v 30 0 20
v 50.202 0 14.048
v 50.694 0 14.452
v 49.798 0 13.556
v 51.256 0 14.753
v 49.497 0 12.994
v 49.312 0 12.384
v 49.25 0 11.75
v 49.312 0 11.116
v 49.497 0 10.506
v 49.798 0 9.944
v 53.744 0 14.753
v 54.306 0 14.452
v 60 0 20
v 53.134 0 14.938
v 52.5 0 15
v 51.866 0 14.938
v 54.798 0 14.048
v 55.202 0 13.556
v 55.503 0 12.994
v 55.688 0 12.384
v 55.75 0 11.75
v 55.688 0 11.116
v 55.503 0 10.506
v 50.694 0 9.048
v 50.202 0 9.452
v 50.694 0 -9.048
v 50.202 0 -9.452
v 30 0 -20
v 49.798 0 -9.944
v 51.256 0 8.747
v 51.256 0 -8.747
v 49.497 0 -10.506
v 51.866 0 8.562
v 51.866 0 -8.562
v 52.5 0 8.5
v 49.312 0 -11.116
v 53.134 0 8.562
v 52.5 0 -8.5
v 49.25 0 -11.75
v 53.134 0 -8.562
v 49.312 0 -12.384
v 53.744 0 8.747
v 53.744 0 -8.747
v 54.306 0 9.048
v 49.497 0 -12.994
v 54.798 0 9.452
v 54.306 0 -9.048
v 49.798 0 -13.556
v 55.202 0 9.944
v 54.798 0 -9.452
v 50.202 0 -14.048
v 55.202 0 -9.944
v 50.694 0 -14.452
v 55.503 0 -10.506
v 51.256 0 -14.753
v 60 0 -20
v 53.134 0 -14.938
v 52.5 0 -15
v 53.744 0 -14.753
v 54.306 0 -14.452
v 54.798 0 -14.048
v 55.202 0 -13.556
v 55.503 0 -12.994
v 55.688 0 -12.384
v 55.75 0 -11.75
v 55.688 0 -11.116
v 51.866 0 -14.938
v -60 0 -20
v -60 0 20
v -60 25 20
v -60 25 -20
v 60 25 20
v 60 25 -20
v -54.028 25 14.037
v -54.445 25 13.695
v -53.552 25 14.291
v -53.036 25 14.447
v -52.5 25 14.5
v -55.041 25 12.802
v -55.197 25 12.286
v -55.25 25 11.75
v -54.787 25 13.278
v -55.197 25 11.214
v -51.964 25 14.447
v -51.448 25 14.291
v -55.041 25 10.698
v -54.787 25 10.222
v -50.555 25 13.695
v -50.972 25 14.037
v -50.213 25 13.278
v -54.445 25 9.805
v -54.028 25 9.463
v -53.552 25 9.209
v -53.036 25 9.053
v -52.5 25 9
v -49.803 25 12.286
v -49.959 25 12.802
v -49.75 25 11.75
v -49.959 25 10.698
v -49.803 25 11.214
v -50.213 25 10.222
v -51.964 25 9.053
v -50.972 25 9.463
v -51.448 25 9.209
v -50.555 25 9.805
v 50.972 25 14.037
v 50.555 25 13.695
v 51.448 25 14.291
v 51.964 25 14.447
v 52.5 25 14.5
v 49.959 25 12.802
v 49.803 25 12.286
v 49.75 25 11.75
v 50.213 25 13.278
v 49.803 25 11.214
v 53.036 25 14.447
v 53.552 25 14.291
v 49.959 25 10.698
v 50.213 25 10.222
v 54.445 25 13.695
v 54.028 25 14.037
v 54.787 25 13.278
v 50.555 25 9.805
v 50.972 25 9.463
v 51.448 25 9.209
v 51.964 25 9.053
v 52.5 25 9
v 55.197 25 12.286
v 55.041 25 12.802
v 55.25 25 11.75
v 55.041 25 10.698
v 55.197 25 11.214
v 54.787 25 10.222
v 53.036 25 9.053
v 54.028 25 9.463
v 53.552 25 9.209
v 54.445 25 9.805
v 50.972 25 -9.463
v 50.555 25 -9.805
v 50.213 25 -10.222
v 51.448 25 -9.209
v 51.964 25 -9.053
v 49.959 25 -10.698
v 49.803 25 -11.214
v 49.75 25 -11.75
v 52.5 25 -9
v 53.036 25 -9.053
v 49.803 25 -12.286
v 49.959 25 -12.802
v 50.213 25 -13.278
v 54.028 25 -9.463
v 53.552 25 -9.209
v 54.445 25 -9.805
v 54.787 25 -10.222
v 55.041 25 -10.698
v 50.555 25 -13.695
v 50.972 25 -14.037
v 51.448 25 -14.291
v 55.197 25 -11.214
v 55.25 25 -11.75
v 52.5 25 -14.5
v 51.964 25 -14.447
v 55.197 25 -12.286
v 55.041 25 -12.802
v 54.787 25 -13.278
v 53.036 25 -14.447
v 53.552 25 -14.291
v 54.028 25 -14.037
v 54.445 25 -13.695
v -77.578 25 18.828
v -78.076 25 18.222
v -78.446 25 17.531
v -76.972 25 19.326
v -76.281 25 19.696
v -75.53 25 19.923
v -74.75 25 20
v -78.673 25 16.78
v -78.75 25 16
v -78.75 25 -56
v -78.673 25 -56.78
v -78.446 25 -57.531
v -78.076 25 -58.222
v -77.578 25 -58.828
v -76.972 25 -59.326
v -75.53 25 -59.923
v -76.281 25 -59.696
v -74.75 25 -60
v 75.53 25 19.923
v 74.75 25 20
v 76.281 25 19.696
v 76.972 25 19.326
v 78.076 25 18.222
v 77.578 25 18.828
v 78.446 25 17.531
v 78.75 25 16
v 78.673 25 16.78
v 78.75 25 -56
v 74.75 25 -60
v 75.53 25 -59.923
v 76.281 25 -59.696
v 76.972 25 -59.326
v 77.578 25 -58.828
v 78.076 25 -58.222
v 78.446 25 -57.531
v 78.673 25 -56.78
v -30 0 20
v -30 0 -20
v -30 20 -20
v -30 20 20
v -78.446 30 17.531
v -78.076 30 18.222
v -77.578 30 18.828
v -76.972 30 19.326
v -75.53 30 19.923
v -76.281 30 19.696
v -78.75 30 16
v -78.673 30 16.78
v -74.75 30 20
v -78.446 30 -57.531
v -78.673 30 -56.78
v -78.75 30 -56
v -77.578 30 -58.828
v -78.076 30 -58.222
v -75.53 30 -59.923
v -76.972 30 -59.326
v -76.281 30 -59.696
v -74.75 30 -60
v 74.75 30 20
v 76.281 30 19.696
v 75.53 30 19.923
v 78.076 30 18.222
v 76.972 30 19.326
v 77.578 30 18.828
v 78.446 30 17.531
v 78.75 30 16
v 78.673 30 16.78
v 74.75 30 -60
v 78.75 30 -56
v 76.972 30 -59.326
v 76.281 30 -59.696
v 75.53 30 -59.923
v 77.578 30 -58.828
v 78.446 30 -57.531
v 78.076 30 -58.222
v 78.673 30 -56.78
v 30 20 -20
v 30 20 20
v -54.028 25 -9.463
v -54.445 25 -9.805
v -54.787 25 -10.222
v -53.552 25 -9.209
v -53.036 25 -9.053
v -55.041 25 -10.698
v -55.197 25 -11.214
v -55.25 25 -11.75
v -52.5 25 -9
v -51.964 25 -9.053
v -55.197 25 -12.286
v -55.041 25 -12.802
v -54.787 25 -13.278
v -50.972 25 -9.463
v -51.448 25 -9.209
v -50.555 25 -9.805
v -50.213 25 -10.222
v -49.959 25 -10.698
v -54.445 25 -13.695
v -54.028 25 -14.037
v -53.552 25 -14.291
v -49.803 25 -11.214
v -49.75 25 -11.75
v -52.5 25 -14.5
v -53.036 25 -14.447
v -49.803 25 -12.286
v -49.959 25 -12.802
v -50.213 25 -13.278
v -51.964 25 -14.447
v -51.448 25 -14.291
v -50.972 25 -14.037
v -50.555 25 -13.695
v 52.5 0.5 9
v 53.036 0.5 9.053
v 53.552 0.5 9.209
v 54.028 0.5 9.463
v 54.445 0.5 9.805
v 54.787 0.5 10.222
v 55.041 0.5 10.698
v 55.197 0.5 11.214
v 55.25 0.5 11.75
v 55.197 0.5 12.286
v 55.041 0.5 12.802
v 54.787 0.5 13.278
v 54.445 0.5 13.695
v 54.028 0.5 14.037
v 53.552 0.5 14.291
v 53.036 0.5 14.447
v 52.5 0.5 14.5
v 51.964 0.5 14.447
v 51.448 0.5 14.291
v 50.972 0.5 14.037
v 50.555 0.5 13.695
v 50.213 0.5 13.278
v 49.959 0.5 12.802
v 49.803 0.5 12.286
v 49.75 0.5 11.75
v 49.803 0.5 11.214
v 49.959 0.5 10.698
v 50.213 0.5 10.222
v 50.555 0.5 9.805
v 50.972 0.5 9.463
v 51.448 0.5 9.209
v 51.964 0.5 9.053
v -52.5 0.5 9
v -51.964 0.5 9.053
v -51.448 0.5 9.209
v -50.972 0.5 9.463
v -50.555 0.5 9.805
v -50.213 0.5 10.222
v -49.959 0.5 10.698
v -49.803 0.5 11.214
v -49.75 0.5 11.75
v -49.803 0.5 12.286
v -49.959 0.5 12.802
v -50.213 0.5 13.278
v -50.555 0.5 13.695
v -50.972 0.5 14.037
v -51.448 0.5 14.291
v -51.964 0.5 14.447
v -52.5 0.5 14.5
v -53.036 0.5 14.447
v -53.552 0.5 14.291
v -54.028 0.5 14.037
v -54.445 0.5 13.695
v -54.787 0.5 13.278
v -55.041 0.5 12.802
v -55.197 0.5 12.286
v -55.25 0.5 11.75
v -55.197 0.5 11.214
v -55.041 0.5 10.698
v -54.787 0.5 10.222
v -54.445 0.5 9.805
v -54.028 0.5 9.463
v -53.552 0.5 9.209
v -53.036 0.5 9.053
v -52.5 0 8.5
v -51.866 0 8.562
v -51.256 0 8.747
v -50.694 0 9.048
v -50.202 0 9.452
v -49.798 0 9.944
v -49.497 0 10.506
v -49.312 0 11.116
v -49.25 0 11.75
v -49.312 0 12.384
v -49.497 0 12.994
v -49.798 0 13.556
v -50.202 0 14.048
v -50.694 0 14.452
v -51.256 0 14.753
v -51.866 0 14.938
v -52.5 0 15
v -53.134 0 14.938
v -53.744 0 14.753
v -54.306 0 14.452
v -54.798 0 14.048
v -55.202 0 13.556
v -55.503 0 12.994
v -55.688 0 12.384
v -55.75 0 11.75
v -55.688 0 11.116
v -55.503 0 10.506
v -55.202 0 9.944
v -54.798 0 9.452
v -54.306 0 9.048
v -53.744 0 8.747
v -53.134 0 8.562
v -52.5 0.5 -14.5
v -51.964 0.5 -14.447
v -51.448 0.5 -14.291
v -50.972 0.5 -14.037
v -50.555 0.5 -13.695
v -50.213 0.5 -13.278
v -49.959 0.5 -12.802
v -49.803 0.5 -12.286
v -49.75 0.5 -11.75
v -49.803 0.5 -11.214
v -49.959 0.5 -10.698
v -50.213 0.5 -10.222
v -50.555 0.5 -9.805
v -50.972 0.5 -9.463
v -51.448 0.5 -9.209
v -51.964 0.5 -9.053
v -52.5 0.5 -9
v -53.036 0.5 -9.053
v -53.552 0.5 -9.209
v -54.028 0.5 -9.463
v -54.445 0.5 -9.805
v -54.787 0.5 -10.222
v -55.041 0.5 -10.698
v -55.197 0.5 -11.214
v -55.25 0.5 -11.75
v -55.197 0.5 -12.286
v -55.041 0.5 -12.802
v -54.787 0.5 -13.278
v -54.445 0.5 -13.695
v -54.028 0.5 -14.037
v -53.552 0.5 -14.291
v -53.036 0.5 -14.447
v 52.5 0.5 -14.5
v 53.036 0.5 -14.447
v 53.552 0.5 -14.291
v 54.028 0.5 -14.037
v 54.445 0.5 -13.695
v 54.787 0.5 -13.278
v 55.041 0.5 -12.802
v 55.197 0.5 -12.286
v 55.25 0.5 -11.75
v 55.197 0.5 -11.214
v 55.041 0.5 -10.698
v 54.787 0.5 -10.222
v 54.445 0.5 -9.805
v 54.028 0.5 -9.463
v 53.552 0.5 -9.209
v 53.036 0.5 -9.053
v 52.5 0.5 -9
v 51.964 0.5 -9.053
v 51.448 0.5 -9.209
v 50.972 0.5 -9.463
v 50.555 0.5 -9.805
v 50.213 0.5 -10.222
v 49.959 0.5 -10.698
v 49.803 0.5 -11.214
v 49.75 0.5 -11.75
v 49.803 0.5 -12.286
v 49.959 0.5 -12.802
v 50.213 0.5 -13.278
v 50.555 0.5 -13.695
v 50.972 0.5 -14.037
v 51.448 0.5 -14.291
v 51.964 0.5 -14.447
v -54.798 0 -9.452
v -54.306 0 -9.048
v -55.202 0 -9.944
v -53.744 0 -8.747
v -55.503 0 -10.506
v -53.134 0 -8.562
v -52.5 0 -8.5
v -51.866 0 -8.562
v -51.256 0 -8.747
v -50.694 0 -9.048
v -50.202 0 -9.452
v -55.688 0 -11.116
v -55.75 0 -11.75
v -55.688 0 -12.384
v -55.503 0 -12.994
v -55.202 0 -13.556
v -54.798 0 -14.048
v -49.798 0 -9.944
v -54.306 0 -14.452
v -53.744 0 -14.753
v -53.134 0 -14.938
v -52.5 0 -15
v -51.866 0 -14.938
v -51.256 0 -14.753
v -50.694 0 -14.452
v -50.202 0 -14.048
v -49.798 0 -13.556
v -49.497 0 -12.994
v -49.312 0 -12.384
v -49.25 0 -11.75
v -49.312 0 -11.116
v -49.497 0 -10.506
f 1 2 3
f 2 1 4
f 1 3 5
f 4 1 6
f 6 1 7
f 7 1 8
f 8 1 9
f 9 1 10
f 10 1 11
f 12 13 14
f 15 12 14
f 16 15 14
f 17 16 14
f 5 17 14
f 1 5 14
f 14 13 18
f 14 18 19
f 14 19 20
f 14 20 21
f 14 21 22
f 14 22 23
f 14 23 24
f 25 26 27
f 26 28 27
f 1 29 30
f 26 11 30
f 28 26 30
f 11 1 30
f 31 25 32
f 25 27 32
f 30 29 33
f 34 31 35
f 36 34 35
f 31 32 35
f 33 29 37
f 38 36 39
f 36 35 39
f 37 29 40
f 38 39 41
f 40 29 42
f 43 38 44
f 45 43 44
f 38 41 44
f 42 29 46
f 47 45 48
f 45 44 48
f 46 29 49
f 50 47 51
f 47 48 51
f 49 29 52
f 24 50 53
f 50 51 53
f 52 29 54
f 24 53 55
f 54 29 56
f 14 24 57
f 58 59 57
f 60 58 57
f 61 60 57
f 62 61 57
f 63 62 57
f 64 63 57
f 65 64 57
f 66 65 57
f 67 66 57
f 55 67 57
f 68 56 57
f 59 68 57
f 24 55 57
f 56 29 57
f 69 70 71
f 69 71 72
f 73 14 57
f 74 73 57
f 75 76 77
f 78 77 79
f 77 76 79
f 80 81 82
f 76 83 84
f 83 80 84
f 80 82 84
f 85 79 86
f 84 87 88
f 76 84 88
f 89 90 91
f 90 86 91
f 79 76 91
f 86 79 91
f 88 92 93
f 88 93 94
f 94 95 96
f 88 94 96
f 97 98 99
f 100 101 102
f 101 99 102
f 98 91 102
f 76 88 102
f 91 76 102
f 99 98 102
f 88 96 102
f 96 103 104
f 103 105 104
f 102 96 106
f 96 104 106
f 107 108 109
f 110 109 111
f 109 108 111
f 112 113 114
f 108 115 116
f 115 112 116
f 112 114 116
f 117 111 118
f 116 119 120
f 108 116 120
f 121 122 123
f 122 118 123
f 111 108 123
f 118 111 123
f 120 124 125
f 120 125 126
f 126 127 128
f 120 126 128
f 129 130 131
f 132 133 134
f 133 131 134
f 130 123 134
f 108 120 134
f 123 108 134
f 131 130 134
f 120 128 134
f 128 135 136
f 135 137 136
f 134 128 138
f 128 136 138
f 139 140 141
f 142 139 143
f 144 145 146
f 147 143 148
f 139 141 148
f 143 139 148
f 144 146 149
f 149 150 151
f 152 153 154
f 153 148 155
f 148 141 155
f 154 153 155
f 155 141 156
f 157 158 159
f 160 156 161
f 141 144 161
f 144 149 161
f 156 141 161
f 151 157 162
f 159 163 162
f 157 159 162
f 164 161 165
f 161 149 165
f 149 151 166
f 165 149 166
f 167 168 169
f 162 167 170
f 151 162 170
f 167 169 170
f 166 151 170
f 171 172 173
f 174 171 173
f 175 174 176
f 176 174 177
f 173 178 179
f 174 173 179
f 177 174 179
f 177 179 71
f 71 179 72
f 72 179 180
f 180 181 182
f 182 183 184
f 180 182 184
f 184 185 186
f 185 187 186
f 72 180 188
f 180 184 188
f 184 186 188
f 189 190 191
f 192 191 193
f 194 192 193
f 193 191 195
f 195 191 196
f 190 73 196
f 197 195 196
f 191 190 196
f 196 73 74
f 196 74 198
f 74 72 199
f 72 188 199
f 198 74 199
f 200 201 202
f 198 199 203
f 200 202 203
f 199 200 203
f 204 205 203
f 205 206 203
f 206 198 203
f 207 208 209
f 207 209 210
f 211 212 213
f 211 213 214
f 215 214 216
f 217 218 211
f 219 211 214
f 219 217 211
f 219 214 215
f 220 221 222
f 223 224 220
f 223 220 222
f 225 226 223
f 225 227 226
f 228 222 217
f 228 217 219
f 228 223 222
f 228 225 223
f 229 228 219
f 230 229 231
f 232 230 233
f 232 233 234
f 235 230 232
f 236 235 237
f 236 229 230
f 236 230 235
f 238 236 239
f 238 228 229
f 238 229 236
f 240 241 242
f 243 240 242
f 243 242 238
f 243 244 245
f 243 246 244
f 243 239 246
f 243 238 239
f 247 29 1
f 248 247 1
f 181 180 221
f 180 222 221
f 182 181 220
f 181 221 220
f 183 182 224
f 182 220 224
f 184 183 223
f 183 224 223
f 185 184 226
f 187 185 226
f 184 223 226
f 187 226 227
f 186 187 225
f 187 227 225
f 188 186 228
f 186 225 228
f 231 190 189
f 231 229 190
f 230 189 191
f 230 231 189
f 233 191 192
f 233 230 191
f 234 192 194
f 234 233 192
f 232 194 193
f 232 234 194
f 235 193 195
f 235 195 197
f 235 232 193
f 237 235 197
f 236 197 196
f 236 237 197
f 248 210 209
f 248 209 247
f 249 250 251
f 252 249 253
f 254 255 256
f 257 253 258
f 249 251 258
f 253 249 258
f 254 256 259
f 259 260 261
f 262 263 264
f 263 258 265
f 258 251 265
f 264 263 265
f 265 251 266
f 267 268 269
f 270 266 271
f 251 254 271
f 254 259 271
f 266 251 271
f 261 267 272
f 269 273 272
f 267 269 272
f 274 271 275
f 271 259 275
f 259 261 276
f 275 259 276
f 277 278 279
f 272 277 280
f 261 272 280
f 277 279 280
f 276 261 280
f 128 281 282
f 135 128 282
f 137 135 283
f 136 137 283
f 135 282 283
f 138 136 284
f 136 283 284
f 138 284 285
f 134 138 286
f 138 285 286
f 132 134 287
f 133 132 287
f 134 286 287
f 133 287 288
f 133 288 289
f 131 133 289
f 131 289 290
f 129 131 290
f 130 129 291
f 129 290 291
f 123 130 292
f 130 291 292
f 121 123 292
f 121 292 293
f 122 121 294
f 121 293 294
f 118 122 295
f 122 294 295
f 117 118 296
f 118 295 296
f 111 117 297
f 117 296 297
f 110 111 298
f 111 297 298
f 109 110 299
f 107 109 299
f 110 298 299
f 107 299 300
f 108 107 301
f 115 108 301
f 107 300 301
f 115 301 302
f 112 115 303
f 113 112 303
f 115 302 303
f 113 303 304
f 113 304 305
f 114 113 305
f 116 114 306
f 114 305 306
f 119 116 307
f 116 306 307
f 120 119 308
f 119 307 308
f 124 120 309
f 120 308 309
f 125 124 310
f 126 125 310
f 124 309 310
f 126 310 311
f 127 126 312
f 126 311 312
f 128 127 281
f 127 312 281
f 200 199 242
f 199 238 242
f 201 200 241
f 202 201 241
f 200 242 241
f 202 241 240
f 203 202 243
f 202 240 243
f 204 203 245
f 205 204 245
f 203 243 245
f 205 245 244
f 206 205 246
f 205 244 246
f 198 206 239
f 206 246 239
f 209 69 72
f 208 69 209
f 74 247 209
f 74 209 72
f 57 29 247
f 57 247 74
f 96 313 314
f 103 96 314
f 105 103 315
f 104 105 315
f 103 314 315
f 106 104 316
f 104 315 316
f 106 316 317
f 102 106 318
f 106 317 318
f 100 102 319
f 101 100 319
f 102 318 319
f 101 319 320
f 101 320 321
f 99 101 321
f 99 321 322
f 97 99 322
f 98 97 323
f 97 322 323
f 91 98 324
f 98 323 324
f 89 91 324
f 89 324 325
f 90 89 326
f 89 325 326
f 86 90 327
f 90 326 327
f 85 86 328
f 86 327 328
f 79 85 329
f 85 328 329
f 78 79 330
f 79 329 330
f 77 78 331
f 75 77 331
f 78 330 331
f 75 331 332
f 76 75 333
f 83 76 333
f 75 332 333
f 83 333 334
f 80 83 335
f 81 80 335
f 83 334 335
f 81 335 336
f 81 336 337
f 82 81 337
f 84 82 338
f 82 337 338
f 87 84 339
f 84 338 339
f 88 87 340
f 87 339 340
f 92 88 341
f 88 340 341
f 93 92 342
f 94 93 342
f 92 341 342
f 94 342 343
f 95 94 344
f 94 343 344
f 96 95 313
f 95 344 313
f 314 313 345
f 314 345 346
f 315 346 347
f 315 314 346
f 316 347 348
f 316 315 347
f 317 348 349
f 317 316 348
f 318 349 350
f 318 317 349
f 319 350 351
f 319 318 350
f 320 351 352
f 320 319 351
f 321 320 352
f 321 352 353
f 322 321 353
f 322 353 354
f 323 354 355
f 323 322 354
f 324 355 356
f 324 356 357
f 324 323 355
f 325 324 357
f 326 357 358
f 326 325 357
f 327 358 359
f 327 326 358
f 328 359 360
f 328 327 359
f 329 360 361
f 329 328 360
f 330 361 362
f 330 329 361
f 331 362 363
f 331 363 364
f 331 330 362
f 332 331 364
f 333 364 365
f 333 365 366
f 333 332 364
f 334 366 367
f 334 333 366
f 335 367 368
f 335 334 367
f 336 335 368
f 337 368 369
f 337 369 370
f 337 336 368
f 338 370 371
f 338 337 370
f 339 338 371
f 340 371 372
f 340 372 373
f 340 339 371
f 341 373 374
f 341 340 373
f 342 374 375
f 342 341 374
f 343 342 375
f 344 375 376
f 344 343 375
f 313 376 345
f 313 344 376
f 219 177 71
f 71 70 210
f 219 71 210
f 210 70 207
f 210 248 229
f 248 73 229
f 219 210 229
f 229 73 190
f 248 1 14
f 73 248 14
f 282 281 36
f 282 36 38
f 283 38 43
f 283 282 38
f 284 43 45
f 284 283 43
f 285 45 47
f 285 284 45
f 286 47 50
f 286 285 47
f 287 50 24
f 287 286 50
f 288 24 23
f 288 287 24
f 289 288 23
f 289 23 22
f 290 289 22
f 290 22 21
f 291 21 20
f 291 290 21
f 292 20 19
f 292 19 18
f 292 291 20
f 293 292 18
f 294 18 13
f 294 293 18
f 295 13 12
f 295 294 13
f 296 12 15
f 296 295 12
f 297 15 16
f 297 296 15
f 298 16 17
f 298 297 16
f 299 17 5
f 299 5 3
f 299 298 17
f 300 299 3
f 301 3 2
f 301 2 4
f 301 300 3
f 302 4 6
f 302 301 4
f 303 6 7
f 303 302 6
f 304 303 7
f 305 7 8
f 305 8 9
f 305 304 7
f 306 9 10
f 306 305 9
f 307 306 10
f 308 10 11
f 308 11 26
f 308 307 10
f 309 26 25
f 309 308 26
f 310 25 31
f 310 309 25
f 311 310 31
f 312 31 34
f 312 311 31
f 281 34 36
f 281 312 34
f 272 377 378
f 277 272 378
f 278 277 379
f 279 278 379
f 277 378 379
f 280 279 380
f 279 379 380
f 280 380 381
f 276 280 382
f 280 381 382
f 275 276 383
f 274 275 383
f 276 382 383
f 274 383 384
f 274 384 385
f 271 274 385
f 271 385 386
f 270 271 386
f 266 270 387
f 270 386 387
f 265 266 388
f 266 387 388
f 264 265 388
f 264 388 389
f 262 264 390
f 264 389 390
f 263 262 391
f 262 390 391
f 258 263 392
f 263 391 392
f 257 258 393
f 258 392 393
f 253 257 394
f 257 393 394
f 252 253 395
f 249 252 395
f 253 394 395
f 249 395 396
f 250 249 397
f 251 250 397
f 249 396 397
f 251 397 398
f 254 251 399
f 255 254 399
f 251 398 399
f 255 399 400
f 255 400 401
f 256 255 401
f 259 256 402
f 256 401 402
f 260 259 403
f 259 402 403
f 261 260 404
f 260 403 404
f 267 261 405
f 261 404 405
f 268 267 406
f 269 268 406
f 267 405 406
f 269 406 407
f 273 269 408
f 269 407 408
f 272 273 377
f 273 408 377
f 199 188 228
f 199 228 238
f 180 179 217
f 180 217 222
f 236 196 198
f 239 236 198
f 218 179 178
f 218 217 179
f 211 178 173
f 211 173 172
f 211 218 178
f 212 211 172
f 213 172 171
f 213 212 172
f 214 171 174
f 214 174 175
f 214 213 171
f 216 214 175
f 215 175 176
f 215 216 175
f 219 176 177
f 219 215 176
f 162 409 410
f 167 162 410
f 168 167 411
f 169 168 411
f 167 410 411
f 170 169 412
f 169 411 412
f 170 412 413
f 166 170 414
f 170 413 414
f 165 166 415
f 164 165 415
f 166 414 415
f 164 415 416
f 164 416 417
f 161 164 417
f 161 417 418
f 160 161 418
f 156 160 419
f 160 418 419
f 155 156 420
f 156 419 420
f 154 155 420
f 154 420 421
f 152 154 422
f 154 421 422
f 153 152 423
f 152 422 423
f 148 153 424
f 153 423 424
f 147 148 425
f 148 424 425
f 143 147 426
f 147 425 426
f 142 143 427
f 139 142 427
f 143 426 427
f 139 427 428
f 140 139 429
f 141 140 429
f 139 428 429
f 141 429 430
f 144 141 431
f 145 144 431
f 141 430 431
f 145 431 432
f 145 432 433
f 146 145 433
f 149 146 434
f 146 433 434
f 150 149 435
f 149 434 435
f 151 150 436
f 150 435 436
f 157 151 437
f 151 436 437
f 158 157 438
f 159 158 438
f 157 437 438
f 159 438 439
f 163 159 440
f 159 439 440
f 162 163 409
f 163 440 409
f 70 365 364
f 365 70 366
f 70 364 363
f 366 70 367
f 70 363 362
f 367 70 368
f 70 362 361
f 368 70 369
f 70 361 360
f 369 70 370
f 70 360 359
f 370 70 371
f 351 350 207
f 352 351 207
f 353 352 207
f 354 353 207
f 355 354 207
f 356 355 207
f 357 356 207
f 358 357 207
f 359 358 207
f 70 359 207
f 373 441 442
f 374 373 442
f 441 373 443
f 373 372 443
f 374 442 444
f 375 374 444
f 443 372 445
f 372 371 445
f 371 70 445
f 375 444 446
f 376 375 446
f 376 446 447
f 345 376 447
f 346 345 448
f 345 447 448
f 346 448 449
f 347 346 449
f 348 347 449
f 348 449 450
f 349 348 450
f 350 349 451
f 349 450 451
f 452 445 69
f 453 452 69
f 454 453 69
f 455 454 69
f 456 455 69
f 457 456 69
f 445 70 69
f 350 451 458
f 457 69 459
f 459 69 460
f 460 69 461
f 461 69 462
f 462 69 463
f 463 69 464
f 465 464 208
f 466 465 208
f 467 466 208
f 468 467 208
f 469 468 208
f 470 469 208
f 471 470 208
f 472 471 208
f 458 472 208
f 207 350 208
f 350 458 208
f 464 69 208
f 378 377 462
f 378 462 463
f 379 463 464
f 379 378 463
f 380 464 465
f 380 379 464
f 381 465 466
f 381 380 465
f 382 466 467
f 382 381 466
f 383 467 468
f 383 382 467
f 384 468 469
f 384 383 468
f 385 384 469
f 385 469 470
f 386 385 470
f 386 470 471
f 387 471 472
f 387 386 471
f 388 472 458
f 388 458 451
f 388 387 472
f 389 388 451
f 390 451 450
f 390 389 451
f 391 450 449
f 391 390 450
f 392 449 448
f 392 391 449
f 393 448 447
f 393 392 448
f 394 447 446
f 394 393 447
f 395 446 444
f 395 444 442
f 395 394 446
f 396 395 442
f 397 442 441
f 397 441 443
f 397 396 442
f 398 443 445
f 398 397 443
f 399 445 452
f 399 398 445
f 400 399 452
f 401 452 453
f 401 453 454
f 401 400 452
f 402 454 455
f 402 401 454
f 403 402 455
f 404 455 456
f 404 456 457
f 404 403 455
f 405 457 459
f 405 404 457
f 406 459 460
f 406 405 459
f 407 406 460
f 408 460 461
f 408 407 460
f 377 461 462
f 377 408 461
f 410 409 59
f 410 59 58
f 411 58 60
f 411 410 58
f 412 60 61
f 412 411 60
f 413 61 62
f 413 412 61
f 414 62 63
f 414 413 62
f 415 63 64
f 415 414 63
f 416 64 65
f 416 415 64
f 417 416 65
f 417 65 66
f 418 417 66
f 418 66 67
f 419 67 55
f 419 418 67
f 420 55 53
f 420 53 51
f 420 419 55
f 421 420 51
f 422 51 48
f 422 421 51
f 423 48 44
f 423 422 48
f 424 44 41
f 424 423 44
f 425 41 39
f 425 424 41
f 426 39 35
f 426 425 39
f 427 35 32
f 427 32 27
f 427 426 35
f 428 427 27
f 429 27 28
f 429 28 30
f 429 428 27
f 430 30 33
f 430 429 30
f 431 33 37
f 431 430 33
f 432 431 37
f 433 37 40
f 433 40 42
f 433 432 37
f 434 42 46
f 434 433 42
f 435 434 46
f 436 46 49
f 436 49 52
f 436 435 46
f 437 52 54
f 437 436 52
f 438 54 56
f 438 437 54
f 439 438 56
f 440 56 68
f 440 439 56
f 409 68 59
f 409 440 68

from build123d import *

# Parameters (mm, degrees)
SKETCH_1_W          = 120
SKETCH_1_H          = 40
EXTRUDE_1_DEPTH     = 25
SKETCH_2_R          = 2.75
CUT_EXTRUDE_1_DEPTH = 25
SKETCH_5_W          = 157.5
SKETCH_5_H          = 80
EXTRUDE_2_DEPTH     = 5
SKETCH_6_W          = 60
SKETCH_6_H          = 40
CUT_EXTRUDE_3_DEPTH = 20
FILLET_1_R          = 4
CHAMFER_1_SIZE      = 0.5


with BuildPart() as part:
    # 草图1 → 凸台-拉伸1 (new body)
    with BuildSketch(Plane(origin=(0, 0, 0), x_dir=(1, 0, 0), z_dir=(0, 1, 0))):
        Rectangle(SKETCH_1_W, SKETCH_1_H)
    extrude(amount=EXTRUDE_1_DEPTH)

    # 草图2 → 切除-拉伸1 (cut)
    with BuildSketch(Plane.XZ):
        with Locations(Location((-52.5, 11.75, 0), (0, 0, 270))):
            Circle(SKETCH_2_R)
        with Locations(Location((-52.5, -11.75, 0), (0, 0, 270))):
            Circle(SKETCH_2_R)
        with Locations(Location((52.5, -11.75, 0), (0, 0, 270))):
            Circle(SKETCH_2_R)
        with Locations(Location((52.5, 11.75, 0), (0, 0, 270))):
            Circle(SKETCH_2_R)
    extrude(amount=-CUT_EXTRUDE_1_DEPTH, mode=Mode.SUBTRACT)

    # 草图5 → 凸台-拉伸2 (add)
    with BuildSketch(Plane(origin=(0, 25, 0), x_dir=(1, 0, 0), z_dir=(0, 1, 0))):
        with Locations((0, 20)):
            Rectangle(SKETCH_5_W, SKETCH_5_H)
    extrude(amount=EXTRUDE_2_DEPTH)

    # 草图6 → 切除-拉伸3 (cut)
    with BuildSketch(Plane.XZ):
        Rectangle(SKETCH_6_W, SKETCH_6_H)
    extrude(amount=-CUT_EXTRUDE_3_DEPTH, mode=Mode.SUBTRACT)

    # 圆角1
    fillet_1_edges = [part.edges().sort_by_distance(p)[0] for p in [
        (-78.75, 27.5, -60),
        (-78.75, 27.5, 20),
        (78.75, 27.5, 20),
        (78.75, 27.5, -60),
    ]]
    fillet(fillet_1_edges, radius=FILLET_1_R)

    # 倒角1
    chamfer_1_edges = [part.edges().sort_by_distance(p)[0] for p in [
        (52.5, 0, 14.5),
        (52.5, 0, -9),
        (-52.5, 0, -9),
        (-52.5, 0, 14.5),
    ]]
    chamfer(chamfer_1_edges, length=CHAMFER_1_SIZE)


solid = part.part
